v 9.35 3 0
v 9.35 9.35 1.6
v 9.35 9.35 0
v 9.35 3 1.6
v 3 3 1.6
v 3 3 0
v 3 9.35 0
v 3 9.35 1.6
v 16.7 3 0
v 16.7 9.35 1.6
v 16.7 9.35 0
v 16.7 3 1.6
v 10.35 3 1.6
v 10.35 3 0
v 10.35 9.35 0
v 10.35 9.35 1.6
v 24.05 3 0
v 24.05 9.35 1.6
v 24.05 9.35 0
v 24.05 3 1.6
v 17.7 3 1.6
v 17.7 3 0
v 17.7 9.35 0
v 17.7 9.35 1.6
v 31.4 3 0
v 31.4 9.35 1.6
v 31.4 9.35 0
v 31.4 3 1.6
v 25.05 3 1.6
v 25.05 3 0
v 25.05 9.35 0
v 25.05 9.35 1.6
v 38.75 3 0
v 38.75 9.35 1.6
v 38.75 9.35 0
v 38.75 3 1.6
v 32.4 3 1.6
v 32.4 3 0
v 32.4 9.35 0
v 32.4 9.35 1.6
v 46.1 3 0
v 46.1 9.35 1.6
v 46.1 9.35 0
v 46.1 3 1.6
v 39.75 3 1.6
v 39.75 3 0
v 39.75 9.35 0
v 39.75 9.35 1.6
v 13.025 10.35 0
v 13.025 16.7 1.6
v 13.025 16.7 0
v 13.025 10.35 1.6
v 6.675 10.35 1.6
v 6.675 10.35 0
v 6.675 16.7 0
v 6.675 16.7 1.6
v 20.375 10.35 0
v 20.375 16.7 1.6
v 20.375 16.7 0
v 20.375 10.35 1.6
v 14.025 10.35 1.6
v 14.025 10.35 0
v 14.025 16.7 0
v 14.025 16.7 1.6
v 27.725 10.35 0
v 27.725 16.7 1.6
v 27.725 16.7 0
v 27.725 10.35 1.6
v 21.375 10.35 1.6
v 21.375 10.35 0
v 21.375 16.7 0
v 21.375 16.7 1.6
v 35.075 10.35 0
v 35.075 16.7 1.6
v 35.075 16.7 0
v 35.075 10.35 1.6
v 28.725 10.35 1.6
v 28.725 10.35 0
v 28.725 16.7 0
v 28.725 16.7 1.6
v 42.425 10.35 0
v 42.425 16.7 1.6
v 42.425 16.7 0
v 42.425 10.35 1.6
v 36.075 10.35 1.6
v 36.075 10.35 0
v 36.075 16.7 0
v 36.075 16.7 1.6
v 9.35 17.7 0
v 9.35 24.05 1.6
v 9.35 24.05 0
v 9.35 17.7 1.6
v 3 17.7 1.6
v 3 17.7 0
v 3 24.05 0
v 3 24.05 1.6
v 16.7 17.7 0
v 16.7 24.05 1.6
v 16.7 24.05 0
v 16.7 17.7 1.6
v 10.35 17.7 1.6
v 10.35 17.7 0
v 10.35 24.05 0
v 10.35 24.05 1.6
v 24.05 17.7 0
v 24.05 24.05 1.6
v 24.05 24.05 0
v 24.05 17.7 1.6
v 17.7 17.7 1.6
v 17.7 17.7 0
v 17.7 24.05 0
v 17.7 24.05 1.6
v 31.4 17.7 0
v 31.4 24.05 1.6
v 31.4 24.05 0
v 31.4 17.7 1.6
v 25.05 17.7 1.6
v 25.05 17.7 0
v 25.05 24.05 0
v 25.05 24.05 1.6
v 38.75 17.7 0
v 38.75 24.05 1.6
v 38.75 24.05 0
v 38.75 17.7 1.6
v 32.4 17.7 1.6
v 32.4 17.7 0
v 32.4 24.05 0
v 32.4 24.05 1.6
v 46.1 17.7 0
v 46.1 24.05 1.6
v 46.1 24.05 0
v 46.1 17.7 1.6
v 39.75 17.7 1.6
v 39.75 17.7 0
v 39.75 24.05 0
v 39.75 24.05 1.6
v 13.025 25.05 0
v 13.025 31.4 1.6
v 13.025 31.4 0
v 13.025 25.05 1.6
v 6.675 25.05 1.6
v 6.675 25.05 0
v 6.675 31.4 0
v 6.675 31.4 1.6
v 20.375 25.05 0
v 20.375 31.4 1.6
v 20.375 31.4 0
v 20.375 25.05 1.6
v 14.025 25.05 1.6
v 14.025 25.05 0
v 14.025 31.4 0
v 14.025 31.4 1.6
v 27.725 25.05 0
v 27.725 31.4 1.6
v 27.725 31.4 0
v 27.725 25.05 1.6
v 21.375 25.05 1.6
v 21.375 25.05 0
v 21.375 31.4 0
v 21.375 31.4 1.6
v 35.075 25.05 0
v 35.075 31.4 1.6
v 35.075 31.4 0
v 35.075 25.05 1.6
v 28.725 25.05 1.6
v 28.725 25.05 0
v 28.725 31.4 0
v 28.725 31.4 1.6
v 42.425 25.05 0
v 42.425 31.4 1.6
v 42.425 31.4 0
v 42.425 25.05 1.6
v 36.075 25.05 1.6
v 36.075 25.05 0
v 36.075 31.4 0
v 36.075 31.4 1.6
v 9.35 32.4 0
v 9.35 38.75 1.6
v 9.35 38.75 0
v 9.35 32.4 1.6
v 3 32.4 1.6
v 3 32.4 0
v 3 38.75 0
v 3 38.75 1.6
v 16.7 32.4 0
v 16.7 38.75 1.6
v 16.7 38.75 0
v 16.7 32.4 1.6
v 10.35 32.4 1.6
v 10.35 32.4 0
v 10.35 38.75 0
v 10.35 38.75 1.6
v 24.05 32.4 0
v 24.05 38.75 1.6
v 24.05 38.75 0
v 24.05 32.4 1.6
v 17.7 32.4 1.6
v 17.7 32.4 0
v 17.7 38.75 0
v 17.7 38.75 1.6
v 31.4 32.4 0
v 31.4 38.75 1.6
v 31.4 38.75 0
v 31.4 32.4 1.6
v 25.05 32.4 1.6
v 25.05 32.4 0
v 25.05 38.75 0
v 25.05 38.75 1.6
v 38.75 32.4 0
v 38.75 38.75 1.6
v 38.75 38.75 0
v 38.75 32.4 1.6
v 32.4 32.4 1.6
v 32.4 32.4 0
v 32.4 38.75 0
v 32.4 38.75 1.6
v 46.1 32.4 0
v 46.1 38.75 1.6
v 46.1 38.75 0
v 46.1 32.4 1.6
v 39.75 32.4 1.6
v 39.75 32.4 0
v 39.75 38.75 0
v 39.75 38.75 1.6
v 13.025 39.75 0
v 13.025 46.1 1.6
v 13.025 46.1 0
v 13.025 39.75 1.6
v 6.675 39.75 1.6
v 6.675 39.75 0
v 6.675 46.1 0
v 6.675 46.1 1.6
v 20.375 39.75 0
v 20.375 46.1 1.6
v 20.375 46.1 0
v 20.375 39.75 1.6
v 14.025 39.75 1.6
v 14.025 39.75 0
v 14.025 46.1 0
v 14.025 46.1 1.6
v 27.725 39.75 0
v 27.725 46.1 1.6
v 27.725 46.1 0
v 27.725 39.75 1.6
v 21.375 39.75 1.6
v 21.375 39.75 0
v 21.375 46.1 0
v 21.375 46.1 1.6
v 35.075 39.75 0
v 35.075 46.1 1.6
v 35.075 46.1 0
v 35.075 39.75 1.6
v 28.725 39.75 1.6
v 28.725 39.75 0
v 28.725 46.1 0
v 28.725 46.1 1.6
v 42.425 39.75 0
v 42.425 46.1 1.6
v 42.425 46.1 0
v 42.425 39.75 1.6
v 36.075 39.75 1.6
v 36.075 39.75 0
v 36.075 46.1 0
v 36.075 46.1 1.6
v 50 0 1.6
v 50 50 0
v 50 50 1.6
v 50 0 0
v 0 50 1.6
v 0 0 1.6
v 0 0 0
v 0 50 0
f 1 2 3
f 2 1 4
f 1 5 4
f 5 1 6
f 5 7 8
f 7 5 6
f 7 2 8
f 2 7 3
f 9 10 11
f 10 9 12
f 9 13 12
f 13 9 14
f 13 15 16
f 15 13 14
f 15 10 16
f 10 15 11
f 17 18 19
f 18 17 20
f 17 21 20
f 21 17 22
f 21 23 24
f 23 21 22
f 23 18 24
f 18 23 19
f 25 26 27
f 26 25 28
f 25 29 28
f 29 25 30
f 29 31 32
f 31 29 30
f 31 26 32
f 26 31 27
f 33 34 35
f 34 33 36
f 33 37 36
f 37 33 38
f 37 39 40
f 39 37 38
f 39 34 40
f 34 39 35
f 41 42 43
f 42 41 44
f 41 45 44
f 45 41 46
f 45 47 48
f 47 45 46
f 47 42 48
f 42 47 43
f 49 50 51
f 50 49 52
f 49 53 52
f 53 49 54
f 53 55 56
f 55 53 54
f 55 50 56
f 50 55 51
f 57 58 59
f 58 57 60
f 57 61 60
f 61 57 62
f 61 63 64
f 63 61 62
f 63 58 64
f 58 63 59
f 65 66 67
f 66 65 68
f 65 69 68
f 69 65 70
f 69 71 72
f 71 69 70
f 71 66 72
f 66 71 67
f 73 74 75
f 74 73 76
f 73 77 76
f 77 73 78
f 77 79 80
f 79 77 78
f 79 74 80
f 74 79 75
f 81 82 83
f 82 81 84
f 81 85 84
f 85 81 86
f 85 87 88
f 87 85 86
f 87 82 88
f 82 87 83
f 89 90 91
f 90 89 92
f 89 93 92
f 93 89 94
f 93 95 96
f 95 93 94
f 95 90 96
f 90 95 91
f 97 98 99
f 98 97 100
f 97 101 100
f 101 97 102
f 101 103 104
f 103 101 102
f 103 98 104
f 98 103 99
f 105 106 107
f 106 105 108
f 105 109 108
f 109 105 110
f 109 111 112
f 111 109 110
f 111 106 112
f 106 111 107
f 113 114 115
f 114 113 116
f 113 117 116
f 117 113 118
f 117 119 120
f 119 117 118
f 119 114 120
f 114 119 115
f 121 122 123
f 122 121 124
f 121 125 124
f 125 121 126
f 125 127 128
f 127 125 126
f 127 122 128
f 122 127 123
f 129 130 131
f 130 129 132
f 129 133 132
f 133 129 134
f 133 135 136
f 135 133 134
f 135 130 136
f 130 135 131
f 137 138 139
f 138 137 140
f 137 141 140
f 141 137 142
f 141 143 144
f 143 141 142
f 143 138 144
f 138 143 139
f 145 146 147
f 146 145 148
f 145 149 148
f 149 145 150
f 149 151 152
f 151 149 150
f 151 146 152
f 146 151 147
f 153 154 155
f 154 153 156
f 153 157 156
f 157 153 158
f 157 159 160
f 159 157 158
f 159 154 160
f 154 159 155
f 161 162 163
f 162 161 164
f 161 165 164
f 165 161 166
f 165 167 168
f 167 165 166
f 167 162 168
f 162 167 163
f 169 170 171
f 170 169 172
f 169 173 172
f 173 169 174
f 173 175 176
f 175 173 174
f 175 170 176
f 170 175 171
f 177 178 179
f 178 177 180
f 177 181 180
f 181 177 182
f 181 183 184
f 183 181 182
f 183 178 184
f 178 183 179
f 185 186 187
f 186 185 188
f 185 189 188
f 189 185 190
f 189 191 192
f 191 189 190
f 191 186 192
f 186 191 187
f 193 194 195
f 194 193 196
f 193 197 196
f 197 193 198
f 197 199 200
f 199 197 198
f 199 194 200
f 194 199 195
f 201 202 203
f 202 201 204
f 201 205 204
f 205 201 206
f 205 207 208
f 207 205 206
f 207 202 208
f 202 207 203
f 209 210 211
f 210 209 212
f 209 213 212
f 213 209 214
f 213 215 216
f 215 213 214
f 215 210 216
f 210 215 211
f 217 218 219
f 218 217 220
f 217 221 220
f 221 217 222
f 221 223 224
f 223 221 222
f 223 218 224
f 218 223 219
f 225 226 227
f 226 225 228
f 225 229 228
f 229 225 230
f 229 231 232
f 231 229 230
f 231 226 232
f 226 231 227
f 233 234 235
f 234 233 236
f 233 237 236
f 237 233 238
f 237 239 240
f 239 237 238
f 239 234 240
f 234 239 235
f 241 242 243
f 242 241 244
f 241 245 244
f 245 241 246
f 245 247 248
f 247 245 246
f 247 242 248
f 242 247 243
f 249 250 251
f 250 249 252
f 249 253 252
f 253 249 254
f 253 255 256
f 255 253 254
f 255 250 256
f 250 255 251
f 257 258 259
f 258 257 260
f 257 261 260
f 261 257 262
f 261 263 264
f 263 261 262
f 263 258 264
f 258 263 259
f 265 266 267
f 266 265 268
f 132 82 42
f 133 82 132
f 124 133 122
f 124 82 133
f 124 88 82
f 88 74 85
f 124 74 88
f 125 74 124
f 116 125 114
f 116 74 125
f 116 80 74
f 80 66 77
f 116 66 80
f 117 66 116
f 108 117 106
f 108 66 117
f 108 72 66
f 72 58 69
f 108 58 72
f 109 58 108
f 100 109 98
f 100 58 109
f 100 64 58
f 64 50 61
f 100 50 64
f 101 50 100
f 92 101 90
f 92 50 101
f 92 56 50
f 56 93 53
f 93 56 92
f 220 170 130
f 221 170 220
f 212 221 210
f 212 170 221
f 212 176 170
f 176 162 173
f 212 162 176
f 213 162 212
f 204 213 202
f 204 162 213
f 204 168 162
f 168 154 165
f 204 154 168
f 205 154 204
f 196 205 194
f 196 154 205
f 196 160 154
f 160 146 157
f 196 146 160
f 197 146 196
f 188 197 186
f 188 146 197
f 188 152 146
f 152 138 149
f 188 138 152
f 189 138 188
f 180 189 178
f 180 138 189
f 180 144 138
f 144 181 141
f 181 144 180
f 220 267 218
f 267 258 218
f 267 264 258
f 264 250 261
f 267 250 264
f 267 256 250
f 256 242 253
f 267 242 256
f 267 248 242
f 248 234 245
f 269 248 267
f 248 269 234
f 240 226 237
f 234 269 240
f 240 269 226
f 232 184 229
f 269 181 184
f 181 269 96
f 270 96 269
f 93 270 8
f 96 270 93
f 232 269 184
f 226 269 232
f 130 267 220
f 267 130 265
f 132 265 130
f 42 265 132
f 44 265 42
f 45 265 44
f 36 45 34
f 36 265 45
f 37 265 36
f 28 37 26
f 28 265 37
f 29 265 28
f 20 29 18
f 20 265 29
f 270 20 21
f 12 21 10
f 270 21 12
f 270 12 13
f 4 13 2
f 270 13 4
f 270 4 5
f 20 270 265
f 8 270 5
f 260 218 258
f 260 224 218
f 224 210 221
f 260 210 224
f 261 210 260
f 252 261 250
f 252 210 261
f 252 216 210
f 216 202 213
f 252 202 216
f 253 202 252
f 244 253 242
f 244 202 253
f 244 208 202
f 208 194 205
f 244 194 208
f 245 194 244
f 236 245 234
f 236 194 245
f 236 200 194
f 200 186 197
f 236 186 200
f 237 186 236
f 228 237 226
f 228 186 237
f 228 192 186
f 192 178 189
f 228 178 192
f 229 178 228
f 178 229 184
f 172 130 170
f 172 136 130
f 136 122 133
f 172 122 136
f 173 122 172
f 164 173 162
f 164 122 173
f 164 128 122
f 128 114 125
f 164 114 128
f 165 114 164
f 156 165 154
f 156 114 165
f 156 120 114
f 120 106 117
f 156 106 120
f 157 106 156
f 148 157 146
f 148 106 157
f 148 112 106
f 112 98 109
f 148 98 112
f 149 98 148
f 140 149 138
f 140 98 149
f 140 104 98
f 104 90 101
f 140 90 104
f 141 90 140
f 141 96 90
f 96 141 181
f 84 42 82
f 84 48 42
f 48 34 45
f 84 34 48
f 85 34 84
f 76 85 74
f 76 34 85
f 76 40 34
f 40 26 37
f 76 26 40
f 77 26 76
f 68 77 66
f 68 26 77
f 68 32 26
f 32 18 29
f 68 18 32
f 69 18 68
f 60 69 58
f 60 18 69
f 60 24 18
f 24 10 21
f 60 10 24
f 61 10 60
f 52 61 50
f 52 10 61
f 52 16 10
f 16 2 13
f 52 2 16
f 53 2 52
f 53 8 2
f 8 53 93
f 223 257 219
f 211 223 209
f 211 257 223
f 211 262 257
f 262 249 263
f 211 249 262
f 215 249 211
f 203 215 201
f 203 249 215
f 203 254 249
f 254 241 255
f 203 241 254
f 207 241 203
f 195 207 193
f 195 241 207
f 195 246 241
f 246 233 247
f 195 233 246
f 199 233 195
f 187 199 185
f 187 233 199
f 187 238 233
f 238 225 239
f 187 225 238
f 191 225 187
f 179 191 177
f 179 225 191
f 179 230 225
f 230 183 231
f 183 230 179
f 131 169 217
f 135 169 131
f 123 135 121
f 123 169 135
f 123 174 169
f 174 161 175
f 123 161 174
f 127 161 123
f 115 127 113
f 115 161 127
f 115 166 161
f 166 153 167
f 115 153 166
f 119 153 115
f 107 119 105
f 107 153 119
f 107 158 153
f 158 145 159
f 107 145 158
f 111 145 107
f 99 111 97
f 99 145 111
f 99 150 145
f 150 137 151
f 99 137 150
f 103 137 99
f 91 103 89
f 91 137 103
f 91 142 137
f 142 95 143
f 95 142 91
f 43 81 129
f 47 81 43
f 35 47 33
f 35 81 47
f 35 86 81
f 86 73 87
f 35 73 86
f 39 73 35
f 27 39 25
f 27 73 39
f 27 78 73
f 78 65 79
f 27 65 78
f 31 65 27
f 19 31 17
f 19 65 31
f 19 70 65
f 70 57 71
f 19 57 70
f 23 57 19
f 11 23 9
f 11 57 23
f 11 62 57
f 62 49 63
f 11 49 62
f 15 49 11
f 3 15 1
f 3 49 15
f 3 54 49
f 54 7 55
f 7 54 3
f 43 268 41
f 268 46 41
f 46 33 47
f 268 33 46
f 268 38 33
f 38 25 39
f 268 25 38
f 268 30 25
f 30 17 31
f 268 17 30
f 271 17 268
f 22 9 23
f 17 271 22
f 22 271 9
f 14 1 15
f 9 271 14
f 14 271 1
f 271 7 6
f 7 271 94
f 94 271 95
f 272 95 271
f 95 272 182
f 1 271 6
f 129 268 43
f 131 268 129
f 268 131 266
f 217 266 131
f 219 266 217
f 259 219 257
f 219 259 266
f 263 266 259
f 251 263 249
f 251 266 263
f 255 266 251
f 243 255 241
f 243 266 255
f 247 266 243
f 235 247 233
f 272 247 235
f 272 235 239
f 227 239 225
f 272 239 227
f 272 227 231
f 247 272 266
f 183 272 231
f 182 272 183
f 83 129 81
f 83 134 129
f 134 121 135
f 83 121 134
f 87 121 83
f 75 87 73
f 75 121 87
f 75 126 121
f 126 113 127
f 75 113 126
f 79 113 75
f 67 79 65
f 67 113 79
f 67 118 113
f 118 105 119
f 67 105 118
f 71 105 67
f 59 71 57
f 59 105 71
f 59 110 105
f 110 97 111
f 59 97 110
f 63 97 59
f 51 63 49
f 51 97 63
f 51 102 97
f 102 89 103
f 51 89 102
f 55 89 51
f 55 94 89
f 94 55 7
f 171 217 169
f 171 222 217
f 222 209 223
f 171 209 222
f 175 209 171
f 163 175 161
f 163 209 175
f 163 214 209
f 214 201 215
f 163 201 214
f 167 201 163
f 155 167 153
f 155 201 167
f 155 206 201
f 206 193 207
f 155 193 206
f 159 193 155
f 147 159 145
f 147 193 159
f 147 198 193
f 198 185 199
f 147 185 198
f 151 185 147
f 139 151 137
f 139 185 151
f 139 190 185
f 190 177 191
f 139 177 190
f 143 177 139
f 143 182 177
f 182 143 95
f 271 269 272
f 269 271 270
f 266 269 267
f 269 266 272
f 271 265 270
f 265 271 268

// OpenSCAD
// SQ-1/4: 1/4 in square (shape punch, realisation punched) NOMINAL size, measure before use
// hole: square {"s": 6.35}; inscribed 6.35 mm; 33 holes; open area 0.687; spec hash 5a5cfab4be80c03f
plate = 50.0; thickness = 1.6;
hole = [[3.1750, -3.1750], [3.1750, 3.1750], [-3.1750, 3.1750], [-3.1750, -3.1750]];
centres = [[6.175, 6.175], [13.525, 6.175], [20.875, 6.175], [28.225, 6.175], [35.575, 6.175], [42.925, 6.175], [9.85, 13.525], [17.2, 13.525], [24.55, 13.525], [31.9, 13.525], [39.25, 13.525], [6.175, 20.875], [13.525, 20.875], [20.875, 20.875], [28.225, 20.875], [35.575, 20.875], [42.925, 20.875], [9.85, 28.225], [17.2, 28.225], [24.55, 28.225], [31.9, 28.225], [39.25, 28.225], [6.175, 35.575], [13.525, 35.575], [20.875, 35.575], [28.225, 35.575], [35.575, 35.575], [42.925, 35.575], [9.85, 42.925], [17.2, 42.925], [24.55, 42.925], [31.9, 42.925], [39.25, 42.925]];
difference() {
  cube([plate, plate, thickness]);
  for (c = centres) translate([c[0], c[1], -1]) linear_extrude(thickness + 2) polygon(hole);
}
